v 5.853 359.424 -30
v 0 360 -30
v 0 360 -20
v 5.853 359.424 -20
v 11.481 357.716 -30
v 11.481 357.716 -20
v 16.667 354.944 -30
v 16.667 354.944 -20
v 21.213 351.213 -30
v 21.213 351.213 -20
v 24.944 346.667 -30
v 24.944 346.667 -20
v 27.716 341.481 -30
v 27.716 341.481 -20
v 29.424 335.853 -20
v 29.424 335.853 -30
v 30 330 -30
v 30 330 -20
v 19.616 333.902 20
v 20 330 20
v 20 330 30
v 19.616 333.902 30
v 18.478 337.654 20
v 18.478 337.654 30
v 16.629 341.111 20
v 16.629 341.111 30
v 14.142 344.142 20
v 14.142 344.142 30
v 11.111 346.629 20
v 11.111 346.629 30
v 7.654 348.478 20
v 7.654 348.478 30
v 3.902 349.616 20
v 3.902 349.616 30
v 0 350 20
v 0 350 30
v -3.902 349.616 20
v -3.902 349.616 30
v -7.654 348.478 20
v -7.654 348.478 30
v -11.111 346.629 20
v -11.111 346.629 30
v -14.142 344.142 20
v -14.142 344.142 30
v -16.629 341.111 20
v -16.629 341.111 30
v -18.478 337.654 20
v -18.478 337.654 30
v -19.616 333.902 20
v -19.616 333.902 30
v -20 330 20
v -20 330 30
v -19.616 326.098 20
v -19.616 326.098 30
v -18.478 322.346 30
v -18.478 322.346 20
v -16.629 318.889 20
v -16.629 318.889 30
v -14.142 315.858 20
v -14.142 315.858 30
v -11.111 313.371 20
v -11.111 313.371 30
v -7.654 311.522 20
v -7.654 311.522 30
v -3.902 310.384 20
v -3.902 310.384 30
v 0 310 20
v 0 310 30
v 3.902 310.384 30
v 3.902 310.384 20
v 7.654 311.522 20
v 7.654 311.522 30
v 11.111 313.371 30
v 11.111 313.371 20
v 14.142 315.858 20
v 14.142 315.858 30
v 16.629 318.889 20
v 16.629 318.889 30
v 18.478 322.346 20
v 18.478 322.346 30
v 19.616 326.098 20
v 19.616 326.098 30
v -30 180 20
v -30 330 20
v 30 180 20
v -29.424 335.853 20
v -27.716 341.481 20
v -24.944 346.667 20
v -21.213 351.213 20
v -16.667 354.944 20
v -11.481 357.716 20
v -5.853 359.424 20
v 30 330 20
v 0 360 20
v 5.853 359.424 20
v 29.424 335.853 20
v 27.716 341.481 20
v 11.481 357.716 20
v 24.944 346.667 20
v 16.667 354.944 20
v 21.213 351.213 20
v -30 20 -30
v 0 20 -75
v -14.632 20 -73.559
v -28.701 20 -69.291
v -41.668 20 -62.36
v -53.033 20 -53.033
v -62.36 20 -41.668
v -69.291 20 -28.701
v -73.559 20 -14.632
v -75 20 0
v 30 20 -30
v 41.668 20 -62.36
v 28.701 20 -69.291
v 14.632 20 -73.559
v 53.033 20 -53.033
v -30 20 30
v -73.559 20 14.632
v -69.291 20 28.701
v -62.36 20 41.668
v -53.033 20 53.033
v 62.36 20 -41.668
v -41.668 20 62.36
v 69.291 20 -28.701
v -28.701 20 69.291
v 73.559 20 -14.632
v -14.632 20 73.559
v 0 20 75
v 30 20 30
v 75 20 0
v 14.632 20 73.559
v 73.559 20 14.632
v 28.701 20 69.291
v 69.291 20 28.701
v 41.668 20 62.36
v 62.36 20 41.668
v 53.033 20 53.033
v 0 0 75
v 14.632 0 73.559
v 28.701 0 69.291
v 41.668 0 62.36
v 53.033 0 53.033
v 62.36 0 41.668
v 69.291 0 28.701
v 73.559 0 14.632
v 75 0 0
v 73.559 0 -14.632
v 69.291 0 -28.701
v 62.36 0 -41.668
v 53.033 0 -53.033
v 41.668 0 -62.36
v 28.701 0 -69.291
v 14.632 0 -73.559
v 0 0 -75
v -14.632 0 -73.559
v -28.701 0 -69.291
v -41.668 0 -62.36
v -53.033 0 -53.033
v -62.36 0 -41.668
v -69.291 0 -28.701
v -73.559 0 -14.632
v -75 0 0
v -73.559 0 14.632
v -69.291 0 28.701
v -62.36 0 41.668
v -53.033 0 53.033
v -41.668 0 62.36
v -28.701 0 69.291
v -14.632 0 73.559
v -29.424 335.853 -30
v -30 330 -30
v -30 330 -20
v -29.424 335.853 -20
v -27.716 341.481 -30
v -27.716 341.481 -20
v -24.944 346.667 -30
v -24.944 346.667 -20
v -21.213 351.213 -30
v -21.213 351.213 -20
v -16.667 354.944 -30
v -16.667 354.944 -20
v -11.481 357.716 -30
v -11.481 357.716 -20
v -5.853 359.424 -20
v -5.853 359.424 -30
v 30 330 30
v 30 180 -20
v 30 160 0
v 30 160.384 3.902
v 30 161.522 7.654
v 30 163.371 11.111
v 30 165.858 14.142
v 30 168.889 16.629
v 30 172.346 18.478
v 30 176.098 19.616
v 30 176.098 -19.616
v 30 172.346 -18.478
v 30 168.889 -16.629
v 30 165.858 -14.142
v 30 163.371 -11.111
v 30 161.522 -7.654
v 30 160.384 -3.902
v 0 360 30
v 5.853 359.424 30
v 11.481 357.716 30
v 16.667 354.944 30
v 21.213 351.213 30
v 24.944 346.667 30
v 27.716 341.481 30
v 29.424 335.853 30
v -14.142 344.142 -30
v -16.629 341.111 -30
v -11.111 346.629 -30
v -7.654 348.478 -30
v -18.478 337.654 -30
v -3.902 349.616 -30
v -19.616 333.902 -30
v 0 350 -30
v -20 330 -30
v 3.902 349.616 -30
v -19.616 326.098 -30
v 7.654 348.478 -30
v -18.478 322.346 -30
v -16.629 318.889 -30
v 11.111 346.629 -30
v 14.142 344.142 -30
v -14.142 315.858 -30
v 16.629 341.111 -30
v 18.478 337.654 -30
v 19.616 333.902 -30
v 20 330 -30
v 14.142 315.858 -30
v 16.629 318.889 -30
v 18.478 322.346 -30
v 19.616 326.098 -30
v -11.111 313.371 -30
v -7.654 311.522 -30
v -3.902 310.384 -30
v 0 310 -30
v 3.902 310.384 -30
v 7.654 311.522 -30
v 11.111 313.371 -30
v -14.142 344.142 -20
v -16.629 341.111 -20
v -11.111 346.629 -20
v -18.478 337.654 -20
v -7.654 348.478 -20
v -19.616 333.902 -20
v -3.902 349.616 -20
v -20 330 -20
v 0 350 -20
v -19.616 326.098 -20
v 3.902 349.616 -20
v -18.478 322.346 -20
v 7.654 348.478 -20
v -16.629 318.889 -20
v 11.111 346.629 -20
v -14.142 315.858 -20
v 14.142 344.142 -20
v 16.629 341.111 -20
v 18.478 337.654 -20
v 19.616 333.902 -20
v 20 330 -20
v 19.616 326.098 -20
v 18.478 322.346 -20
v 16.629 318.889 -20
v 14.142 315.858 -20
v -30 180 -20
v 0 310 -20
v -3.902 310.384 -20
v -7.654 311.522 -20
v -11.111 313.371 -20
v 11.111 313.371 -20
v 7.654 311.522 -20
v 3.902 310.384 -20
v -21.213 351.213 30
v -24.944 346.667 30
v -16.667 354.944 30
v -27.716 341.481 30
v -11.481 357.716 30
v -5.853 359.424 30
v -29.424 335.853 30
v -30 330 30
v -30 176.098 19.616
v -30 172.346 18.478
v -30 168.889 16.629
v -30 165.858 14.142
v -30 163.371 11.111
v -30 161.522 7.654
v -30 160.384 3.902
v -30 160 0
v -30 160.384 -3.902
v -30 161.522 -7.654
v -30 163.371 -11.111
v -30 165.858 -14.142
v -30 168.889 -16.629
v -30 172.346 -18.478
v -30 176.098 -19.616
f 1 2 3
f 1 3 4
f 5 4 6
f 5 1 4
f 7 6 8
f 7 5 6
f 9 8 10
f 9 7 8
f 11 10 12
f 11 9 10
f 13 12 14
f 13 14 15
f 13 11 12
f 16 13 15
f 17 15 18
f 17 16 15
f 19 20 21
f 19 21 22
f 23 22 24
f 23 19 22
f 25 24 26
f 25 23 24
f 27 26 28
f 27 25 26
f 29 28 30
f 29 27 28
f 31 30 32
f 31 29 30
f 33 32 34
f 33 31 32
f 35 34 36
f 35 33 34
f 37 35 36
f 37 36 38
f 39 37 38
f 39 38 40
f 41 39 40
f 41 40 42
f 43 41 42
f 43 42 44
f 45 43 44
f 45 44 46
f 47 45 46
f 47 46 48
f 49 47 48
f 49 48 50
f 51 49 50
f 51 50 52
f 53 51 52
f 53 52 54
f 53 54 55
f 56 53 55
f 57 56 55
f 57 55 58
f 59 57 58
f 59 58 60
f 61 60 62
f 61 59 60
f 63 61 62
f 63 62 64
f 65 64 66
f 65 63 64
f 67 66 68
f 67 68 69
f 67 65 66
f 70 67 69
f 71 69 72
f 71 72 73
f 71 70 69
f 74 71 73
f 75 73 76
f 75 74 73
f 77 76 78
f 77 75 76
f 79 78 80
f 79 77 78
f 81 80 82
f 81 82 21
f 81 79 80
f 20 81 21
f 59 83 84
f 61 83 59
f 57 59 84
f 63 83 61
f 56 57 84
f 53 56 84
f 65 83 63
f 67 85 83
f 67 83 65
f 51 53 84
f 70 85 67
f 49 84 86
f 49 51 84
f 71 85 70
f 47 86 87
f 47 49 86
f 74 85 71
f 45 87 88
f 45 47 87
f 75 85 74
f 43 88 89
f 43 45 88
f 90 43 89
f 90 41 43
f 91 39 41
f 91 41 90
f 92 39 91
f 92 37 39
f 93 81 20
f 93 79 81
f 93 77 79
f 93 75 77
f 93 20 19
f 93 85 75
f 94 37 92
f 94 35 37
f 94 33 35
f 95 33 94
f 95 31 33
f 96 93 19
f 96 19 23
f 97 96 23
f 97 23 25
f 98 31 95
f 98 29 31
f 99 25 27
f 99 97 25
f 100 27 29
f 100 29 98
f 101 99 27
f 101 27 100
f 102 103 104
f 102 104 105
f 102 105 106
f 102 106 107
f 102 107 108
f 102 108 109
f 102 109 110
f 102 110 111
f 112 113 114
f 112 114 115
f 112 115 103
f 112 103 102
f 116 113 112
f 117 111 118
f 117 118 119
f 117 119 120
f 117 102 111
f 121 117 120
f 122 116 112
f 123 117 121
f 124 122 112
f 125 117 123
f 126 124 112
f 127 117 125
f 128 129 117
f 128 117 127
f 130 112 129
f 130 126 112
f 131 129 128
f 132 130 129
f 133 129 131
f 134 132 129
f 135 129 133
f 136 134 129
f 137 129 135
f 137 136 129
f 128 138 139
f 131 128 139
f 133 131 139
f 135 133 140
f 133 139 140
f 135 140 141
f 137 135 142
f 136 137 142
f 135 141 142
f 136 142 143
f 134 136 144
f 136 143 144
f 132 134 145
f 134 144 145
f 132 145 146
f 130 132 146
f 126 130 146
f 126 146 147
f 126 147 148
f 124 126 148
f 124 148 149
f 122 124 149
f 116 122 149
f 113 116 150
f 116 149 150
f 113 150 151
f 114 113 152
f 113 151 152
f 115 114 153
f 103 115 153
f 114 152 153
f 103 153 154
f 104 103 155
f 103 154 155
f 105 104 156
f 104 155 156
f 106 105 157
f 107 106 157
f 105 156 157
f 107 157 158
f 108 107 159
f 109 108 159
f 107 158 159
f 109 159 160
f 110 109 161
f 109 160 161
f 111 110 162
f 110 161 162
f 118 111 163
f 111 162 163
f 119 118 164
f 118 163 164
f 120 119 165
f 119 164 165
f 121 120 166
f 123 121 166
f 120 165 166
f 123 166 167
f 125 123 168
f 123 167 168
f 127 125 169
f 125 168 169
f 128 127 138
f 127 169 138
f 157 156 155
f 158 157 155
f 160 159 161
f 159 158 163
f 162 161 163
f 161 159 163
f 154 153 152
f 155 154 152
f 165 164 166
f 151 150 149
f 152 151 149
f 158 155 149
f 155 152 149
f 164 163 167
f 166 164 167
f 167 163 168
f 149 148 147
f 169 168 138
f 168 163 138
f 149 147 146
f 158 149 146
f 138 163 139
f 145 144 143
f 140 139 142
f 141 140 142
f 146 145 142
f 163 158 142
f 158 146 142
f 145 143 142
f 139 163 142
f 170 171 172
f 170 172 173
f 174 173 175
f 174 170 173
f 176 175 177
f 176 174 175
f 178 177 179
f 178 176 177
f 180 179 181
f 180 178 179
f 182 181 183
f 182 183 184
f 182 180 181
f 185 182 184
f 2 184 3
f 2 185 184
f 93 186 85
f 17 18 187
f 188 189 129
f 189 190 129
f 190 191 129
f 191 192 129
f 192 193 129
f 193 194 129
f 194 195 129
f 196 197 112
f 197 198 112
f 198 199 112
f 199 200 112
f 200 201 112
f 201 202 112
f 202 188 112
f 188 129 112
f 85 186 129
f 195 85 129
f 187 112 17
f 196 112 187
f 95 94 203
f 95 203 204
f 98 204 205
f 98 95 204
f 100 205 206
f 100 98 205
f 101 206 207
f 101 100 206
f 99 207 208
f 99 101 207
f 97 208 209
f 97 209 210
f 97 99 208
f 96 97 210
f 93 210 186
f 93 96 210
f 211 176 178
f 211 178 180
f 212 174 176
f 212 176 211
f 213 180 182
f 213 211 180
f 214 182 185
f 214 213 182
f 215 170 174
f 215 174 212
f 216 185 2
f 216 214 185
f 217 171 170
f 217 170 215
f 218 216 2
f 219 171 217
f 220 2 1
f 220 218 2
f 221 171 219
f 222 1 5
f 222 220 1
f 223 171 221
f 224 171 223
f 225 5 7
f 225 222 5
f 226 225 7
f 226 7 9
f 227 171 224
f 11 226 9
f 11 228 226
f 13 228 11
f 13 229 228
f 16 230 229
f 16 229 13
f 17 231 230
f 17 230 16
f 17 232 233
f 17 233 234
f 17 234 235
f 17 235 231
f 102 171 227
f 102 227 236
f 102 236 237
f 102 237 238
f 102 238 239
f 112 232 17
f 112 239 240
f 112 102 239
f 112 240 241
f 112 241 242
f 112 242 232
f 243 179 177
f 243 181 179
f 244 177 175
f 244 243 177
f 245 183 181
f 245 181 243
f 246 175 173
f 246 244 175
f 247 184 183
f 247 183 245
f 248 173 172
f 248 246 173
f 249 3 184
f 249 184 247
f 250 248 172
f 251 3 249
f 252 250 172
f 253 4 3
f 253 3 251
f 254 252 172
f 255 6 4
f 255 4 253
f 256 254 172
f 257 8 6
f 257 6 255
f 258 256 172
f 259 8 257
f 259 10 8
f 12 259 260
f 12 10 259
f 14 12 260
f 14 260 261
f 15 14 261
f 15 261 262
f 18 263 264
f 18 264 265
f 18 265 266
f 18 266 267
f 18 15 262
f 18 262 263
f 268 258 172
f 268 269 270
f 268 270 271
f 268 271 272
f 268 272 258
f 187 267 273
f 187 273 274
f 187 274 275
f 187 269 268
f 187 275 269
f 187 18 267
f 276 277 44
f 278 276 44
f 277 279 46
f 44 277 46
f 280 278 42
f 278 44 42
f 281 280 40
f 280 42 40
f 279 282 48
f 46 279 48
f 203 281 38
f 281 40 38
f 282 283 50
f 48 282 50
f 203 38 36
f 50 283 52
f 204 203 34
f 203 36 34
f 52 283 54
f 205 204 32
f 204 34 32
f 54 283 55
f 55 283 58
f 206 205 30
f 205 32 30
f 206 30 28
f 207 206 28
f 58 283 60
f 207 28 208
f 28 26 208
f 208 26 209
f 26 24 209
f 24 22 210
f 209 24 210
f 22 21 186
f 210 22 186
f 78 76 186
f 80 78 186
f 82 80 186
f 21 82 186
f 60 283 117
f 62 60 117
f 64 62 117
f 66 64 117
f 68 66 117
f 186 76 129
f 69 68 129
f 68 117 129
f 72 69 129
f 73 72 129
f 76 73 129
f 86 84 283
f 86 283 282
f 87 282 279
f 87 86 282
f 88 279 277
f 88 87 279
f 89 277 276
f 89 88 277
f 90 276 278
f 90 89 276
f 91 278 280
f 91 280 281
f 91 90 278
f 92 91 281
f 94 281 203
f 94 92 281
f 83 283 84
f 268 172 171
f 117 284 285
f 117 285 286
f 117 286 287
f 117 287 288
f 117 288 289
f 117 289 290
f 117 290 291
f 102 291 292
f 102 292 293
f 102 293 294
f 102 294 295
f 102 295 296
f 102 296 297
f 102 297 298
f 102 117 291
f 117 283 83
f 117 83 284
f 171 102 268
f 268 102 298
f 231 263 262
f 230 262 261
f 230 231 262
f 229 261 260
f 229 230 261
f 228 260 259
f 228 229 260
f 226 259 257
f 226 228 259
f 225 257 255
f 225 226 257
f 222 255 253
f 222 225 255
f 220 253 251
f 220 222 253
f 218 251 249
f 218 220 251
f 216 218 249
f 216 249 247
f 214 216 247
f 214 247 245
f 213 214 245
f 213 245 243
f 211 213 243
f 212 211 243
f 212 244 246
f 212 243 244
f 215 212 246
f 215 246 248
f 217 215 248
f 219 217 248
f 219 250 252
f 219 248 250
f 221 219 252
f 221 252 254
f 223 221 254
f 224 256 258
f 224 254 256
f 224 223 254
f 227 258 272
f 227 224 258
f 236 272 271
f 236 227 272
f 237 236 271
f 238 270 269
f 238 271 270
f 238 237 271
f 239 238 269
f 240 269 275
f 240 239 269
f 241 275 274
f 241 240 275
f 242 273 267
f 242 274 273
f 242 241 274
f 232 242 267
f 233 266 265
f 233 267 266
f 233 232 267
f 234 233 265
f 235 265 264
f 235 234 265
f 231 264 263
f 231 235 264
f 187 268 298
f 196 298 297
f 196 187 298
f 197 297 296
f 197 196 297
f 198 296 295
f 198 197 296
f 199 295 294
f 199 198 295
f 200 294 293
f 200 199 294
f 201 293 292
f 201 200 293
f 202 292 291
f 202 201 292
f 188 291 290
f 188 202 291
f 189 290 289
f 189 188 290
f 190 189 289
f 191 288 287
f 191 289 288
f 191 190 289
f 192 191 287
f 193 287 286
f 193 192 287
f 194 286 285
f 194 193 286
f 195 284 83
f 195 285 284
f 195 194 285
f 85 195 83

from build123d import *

# Parameters (mm, degrees)
SKETCH1_R           = 75
SKETCH1_W           = 60
SKETCH1_H           = 60
BOSS_EXTRUDE1_DEPTH = 20
SKETCH1_2_W         = 60
SKETCH1_2_H         = 60
BOSS_EXTRUDE2_DEPTH = 360
CUT_EXTRUDE1_DEPTH  = 383.426463519
SKETCH3_R           = 20
CUT_EXTRUDE2_DEPTH  = 383.426463519


with BuildPart() as part:
    # Sketch1 → Boss-Extrude1 (new body)
    with BuildSketch(Plane(origin=(0, 0, 0), x_dir=(1, 0, 0), z_dir=(0, 1, 0))):
        Circle(SKETCH1_R)
        Rectangle(SKETCH1_W, SKETCH1_H, mode=Mode.SUBTRACT)
    extrude(amount=BOSS_EXTRUDE1_DEPTH)

    # Sketch1<2> → Boss-Extrude2 (add)
    with BuildSketch(Plane(origin=(0, 0, 0), x_dir=(1, 0, 0), z_dir=(0, 1, 0))):
        Rectangle(SKETCH1_2_W, SKETCH1_2_H)
    extrude(amount=BOSS_EXTRUDE2_DEPTH)

    # Sketch2 → Cut-Extrude1 (cut, through all)
    with BuildSketch(Plane(origin=(30, 0, 0), x_dir=(0, 0, -1), z_dir=(1, 0, 0))):
        with BuildLine():
            Line((-20, 360), (20, 360))
            Line((20, 360), (20, 180))
            ThreePointArc((20, 180), (0, 160), (-20, 180))
            Line((-20, 180), (-20, 360))
        make_face()
    extrude(amount=-CUT_EXTRUDE1_DEPTH, mode=Mode.SUBTRACT)

    # Sketch3 → Cut-Extrude2 (cut, through all)
    with BuildSketch(Plane.XY.offset(30)):
        with BuildLine():
            Line((-30, 360), (-30, 330))
            ThreePointArc((-30, 330), (-21.21320334, 351.213203531), (2.71e-07, 360))
            Line((2.71e-07, 360), (-30, 360))
        make_face()
        with BuildLine():
            ThreePointArc((2.71e-07, 360), (21.213203531, 351.21320334), (30, 330))
            Line((30, 330), (30, 360))
            Line((30, 360), (2.71e-07, 360))
        make_face()
        with Locations((0, 330)):
            Circle(SKETCH3_R)
    extrude(amount=-CUT_EXTRUDE2_DEPTH, mode=Mode.SUBTRACT)


solid = part.part
